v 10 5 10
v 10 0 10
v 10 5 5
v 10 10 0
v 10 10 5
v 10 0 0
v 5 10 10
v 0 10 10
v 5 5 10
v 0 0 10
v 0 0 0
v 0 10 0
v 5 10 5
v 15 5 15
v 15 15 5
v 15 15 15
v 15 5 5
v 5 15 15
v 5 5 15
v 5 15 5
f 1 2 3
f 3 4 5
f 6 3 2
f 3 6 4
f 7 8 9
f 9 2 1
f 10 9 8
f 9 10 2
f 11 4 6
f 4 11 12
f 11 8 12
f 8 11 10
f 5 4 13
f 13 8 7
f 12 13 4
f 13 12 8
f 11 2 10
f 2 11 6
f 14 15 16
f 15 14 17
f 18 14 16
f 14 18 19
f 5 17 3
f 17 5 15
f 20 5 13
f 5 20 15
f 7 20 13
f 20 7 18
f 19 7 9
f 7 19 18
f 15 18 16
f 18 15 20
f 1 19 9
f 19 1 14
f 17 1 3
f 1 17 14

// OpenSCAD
// union of overlapping solids
union() {
  cube(10);
  translate([5, 5, 5]) cube(10);
}
